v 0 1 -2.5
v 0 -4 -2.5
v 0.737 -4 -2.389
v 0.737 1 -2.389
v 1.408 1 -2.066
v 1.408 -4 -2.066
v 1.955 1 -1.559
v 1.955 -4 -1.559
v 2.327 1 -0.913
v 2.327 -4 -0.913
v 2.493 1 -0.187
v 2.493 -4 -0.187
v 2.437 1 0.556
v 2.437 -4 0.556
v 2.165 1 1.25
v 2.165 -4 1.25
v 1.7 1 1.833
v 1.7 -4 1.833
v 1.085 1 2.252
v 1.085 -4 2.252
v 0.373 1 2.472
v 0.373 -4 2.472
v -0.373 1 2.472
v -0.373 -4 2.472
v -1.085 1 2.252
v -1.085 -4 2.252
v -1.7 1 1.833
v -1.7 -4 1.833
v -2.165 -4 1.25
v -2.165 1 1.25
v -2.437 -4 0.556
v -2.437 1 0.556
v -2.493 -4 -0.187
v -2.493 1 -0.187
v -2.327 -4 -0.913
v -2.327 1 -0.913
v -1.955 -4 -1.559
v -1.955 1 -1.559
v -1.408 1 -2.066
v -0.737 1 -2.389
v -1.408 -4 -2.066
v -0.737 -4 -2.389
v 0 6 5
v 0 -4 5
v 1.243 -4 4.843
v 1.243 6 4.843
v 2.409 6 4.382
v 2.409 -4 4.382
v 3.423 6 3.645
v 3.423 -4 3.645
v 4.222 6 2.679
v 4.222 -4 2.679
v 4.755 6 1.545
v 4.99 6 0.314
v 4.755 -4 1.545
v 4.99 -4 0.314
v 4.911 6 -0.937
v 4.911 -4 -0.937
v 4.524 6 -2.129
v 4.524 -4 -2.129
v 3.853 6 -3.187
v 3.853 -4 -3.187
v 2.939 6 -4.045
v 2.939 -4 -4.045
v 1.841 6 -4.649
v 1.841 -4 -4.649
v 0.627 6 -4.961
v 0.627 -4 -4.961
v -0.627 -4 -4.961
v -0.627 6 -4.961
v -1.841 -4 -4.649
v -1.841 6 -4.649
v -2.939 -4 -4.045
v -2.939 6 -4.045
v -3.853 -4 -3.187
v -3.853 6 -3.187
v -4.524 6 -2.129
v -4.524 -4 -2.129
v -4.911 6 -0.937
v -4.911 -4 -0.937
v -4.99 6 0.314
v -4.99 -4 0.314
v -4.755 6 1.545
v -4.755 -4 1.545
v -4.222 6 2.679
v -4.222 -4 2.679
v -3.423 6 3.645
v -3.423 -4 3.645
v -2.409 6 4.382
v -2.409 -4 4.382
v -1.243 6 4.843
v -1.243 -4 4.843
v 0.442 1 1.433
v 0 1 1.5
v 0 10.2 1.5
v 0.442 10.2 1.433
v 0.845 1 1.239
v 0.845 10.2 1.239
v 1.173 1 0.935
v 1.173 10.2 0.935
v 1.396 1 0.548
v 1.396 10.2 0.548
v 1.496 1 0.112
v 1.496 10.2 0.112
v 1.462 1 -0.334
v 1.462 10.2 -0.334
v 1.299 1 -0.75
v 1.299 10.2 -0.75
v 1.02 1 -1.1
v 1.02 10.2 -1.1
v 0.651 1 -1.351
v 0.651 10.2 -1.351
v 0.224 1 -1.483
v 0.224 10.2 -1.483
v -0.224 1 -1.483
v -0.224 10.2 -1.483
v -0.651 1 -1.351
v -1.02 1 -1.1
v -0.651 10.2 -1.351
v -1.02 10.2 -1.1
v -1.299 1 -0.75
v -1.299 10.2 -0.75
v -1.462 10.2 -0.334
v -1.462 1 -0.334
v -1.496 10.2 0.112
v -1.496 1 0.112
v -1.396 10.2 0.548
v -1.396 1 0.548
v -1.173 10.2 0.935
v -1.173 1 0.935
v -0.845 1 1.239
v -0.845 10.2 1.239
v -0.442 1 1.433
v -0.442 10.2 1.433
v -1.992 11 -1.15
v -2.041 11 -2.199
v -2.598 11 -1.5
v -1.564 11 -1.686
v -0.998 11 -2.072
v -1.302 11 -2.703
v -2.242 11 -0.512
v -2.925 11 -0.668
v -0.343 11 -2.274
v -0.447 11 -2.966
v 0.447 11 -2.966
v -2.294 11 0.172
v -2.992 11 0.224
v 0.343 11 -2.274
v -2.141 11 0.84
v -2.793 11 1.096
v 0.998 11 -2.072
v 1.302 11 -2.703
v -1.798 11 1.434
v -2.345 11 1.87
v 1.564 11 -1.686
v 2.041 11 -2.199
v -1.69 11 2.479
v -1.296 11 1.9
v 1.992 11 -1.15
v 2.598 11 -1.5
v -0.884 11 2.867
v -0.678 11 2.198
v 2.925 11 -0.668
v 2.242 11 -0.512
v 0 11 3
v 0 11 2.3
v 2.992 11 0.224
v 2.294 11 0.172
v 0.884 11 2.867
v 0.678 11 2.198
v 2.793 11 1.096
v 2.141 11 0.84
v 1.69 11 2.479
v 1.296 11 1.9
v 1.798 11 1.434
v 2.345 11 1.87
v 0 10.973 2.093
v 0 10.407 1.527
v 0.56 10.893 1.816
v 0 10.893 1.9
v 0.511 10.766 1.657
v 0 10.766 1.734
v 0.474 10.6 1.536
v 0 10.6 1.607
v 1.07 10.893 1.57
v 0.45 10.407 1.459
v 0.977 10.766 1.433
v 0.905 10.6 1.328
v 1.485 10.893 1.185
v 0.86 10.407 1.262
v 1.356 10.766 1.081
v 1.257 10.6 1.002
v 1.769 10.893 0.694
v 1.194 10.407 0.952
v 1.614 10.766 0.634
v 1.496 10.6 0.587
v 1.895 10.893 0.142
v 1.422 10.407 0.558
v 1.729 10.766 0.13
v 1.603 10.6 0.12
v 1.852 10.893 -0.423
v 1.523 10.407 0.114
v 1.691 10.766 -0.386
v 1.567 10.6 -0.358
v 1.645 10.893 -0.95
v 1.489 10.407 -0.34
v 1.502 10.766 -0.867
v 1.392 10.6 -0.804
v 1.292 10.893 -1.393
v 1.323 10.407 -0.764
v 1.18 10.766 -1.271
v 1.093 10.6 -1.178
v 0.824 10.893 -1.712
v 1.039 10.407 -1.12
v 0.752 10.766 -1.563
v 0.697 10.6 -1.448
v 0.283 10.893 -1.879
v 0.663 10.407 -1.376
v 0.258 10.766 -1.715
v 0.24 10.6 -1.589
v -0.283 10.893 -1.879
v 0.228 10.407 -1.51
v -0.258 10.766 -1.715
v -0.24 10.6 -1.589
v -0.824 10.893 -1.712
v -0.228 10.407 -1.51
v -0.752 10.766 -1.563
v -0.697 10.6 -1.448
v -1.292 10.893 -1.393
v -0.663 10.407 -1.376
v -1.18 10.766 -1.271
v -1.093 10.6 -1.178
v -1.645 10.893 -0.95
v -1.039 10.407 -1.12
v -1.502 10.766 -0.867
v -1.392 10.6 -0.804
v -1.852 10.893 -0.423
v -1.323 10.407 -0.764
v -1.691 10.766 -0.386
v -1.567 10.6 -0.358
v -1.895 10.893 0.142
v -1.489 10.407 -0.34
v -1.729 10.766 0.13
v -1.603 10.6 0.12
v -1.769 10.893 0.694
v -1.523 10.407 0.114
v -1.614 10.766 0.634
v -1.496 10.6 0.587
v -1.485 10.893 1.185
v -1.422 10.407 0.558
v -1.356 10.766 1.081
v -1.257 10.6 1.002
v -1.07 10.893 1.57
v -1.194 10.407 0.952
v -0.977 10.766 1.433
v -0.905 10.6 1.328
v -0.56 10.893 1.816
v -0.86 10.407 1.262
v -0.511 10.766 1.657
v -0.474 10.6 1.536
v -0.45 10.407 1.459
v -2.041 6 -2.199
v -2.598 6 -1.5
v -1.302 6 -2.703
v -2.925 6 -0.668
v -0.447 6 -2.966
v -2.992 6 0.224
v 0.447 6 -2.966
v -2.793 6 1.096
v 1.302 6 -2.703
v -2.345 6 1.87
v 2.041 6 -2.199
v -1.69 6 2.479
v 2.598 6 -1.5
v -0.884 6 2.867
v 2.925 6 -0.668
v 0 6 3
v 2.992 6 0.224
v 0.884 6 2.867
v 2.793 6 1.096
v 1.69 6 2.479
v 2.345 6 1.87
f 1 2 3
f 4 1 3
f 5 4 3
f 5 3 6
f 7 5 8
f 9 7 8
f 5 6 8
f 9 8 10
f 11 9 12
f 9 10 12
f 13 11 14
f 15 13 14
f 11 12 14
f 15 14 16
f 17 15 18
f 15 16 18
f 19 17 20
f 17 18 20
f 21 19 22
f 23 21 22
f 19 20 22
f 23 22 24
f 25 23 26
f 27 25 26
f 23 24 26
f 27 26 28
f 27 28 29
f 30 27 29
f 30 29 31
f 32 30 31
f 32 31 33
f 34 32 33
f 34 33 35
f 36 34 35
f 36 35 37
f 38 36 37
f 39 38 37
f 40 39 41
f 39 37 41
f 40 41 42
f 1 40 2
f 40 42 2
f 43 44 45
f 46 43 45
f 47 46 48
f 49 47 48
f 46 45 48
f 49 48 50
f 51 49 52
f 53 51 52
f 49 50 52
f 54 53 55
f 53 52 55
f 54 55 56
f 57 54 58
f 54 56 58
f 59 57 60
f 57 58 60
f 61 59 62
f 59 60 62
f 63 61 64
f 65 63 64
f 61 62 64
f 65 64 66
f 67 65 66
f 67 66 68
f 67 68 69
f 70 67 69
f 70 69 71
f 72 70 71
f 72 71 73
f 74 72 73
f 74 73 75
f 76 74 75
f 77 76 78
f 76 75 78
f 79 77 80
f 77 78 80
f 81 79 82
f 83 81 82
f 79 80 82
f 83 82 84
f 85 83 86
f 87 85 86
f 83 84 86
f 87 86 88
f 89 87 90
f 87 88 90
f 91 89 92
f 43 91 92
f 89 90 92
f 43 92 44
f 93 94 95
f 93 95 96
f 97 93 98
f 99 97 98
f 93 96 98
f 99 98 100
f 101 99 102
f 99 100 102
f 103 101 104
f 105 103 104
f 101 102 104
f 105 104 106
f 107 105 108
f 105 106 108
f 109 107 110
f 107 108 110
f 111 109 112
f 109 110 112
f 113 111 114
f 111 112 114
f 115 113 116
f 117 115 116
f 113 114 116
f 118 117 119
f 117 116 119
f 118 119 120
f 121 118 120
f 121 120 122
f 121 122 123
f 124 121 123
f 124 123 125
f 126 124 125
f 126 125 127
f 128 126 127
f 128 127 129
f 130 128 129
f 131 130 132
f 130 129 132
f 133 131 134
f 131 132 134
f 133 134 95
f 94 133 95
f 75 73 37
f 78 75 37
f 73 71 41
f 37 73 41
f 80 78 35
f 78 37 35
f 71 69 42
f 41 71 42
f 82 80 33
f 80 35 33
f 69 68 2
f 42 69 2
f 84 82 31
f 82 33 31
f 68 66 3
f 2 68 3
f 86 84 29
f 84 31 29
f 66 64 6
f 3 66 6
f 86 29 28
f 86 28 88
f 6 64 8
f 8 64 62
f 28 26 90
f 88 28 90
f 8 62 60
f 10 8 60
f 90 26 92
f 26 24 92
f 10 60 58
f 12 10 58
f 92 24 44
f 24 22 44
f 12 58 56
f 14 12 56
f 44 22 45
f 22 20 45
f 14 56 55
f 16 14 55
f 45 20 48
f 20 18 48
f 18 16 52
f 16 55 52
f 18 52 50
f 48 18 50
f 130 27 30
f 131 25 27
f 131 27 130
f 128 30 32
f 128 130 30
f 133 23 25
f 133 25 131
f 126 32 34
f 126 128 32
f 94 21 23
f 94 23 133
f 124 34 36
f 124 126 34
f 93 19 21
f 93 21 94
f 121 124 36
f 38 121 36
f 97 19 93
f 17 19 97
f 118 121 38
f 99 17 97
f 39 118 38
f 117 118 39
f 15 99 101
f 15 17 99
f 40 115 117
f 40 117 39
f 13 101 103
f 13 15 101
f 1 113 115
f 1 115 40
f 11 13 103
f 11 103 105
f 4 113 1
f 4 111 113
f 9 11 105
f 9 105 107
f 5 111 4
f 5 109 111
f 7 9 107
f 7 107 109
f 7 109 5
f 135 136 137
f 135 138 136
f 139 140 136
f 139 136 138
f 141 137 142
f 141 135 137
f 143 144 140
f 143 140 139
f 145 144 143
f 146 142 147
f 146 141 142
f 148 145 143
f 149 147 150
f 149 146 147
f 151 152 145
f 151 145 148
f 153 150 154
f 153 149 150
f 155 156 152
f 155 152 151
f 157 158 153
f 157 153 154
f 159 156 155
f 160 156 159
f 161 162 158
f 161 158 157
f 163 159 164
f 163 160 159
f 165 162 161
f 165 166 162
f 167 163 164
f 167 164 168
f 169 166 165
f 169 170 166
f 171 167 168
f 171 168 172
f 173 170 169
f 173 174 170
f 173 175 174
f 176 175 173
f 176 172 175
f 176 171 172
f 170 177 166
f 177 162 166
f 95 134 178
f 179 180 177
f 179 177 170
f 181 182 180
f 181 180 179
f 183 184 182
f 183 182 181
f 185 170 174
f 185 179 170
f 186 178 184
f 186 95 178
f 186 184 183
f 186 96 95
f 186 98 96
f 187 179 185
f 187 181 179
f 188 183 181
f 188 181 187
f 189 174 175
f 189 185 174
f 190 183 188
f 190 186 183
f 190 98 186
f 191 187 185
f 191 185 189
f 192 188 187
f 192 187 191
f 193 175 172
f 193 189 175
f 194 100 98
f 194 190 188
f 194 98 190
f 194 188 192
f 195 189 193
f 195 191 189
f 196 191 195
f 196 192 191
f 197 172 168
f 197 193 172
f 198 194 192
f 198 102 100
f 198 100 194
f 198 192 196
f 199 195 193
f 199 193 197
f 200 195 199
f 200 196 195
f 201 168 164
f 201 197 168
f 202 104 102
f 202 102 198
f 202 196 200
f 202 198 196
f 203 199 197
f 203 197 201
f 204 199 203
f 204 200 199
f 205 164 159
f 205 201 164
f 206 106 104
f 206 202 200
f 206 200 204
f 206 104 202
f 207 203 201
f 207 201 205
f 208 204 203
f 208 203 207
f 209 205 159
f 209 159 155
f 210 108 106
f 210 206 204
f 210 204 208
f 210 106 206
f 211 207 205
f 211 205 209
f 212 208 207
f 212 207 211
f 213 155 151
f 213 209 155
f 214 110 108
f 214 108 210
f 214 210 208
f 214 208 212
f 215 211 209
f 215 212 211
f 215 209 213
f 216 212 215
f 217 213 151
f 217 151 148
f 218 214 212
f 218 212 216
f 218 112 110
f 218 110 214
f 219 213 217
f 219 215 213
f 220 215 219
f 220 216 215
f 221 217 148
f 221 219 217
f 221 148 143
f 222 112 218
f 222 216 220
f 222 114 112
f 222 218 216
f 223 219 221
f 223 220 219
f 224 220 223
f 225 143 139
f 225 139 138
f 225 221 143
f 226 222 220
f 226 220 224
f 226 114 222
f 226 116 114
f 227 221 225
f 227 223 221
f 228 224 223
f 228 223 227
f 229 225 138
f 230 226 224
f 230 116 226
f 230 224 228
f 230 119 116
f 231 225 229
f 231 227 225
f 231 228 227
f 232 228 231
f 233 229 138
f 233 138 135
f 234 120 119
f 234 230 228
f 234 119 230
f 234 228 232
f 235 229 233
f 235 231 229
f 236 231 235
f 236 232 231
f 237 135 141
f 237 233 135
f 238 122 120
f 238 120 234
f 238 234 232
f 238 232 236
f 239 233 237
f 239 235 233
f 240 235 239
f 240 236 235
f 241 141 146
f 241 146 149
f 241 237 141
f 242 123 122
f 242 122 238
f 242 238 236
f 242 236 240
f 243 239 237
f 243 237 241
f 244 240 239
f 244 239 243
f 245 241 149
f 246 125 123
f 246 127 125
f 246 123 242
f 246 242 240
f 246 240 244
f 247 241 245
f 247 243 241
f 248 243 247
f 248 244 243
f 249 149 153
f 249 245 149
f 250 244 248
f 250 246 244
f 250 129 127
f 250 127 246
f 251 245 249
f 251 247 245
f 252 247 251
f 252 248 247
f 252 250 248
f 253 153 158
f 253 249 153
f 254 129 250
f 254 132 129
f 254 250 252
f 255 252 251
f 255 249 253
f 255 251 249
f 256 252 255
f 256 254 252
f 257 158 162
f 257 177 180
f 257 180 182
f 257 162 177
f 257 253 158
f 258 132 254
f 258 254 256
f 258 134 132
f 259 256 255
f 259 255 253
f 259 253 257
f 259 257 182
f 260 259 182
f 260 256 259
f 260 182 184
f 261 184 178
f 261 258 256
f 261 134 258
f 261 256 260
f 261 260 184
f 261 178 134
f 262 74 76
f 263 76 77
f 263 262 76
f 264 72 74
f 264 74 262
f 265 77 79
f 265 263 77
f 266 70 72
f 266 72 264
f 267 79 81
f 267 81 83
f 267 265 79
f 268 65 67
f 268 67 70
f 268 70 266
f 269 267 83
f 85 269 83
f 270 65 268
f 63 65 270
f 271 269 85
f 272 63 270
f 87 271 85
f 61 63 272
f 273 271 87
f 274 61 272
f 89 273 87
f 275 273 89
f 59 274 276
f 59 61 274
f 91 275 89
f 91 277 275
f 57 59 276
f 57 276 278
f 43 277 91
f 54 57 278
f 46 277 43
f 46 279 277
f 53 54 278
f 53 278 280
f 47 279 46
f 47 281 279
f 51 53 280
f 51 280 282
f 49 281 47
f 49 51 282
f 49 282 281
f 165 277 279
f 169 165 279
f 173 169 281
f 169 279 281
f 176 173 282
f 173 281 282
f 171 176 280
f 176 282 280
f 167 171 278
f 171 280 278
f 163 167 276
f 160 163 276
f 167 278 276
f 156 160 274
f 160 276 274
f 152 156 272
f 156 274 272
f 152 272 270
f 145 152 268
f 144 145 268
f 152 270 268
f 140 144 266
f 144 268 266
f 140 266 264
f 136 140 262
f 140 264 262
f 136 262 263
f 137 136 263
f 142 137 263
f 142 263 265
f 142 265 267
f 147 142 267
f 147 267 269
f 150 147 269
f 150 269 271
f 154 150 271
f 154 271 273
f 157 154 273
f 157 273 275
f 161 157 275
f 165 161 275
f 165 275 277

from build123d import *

# Parameters (mm, degrees)
BOSS_EXTRU_1_DEPTH      = 6
BOSS_EXTRU_1_DEPTH_BACK = 4
ESQUISSE1_R             = 5
BOSS_EXTRU_2_DEPTH      = 5
BOSS_EXTRU_2_DEPTH_BACK = 1
ESQUISSE2_R             = 3
ESQUISSE3_R             = 1.5
ENL_V_MAT_EXTRU_2_DEPTH = 10
ESQUISSE4_R             = 2.5
ENL_V_MAT_EXTRU_3_DEPTH = 5
CONG_1_R                = 0.8


with BuildPart() as part:
    # Esquisse1 → Boss.-Extru.1 (new, two sides: drawn at the far end of the back side and taken through both)
    with BuildSketch(Plane(origin=(0, 0, 0), x_dir=(1, 0, 0), z_dir=(0, 1, 0)).offset(-BOSS_EXTRU_1_DEPTH_BACK)):
        with Locations(Location((0, 0, 0), (0, 0, 270))):
            Circle(ESQUISSE1_R)
    extrude(amount=BOSS_EXTRU_1_DEPTH + BOSS_EXTRU_1_DEPTH_BACK)

    # Esquisse2 → Boss.-Extru.2 (add, two sides: drawn at the far end of the back side and taken through both)
    with BuildSketch(Plane(origin=(0, 6, 0), x_dir=(1, 0, 0), z_dir=(0, 1, 0)).offset(-BOSS_EXTRU_2_DEPTH_BACK)):
        with Locations(Location((0, 0, 0), (0, 0, 270))):
            Circle(ESQUISSE2_R)
    extrude(amount=BOSS_EXTRU_2_DEPTH + BOSS_EXTRU_2_DEPTH_BACK)

    # Esquisse3 → Enlèv. mat.-Extru.2 (cut)
    with BuildSketch(Plane(origin=(0, 11, 0), x_dir=(1, 0, 0), z_dir=(0, 1, 0))):
        with Locations(Location((0, 0, 0), (0, 0, 270))):
            Circle(ESQUISSE3_R)
    extrude(amount=-ENL_V_MAT_EXTRU_2_DEPTH, mode=Mode.SUBTRACT)

    # Esquisse4 → Enlèv. mat.-Extru.3 (cut)
    with BuildSketch(Plane.XZ.offset(4)):
        with Locations(Location((0, 0, 0), (0, 0, 270))):
            Circle(ESQUISSE4_R)
    extrude(amount=-ENL_V_MAT_EXTRU_3_DEPTH, mode=Mode.SUBTRACT)

    # Congé1
    cong_1_edges = [part.edges().sort_by_distance(p)[0] for p in [
        (0, 11, -1.5),
    ]]
    fillet(cong_1_edges, radius=CONG_1_R)


solid = part.part
